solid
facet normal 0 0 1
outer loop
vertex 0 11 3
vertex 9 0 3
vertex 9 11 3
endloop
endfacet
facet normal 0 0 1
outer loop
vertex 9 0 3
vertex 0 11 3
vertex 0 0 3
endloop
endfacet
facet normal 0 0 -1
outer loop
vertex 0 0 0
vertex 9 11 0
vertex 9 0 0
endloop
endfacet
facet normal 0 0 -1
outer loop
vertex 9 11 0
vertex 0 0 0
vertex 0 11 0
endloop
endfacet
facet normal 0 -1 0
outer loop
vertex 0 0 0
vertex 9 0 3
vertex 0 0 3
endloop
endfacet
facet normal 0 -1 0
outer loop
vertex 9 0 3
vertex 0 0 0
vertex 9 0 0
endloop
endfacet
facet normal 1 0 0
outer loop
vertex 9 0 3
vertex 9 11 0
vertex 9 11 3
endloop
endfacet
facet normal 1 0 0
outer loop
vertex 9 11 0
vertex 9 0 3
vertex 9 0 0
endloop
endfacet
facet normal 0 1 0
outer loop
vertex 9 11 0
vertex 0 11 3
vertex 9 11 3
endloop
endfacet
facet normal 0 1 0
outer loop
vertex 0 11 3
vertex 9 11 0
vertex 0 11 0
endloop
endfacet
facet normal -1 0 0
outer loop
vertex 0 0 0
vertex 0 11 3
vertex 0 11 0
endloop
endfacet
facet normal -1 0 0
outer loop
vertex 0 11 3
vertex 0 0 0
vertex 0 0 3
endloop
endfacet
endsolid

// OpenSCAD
// Generated by SolidPython 1.0.1 on 2020-07-29 00:46:55


cube(size = [9, 11, 3]);
/***********************************************
*********      SolidPython code:      **********
************************************************
 
# import packages: SolidPython
from solid import *
from solid.utils import *
from itertools import chain, combinations, permutations


class Resize:

    def __init__(self, scad_file):
        self.scad_file = scad_file
        #self.scad_file = import_scad(scad_file)
        # cone/cylinder param:
        self.r1 = 0
        self.r2 = 0
        self.h = 0
        # rectangular prism param:
        self.w = 0
        self.l = 0
        # ellipse param:
        self.r = 0

    # import OpenScad code (file name corresponds to shape)


    # classify shape + parameters
    def assign(self, param1, param2, param3):
        if self.scad_file == 'cone.scad':
            self.r1 = param1
            self.r2 = param2
            self.h = param3
        elif self.scad_file == 'cylinder.scad':
            self.r1 = param1
            self.r2 = param2
            self.h = param3
        elif self.scad_file == 'rectangularPrism.scad':
            self.h = param1
            self.l = param2
            self.w = param3
        else:
            self.r = param1
            self.h = param2

    # resize parameters
    def iterate(self):
        x = range(3, 20, 2)
        i = 1
        if self.scad_file == 'cone.scad':
            tempList = list(permutations(x, 2))
            for temp in tempList:
                param1 = temp[0]
                param2 = temp[1]
                filepath = 'produced_scad_files/' + 'cone' + str(param1) + '_' + str(param2) + '_' + '.scad'
                scad_render_to_file(cylinder(h=param1, r1=param2, r2=0), filepath)

        elif self.scad_file == 'cylinder.scad':
            tempList = list(permutations(x, 3))
            for temp in tempList:
                param1 = temp[0]
                param2 = temp[1]
                filepath = 'produced_scad_files/' + 'cylinder' + str(param1) + '_' + str(param2) + '_' + '.scad'
                scad_render_to_file(cylinder(h=param1, r1=param2, r2=param2), filepath)

        elif self.scad_file == 'rectangularPrism.scad':
            tempList = list(permutations(x, 3))
            for temp in tempList:
                param1 = temp[0]
                param2 = temp[1]
                param3 = temp[2]
                filepath = 'produced_scad_files/' + 'rectangularPrism' + str(param1) + '_' + str(param2) + '_' + str(
                    param3) + '.scad'
                scad_render_to_file(cube(size=(param1, param2, param3)), filepath)

        elif self.scad_file == 'ellipse.scad':
            tempList = list(permutations(x, 4))
            for temp in tempList:
                param1 = temp[0]
                param2 = temp[1]
                param3 = temp[2]
                param4 = temp[3]
                filepath = 'produced_scad_files/' + 'ellipse' + str(param1) + '_' + str(param2) + '_' + str(param3) + '_' + str(param4) + '.scad'
                scad_render_to_file(scale([param1, param2, param3])(sphere(r=param4)), filepath)

    def render_to_scadfile(self):
        scad_render_to_file(scad, 'example.scad') 
 
************************************************/
